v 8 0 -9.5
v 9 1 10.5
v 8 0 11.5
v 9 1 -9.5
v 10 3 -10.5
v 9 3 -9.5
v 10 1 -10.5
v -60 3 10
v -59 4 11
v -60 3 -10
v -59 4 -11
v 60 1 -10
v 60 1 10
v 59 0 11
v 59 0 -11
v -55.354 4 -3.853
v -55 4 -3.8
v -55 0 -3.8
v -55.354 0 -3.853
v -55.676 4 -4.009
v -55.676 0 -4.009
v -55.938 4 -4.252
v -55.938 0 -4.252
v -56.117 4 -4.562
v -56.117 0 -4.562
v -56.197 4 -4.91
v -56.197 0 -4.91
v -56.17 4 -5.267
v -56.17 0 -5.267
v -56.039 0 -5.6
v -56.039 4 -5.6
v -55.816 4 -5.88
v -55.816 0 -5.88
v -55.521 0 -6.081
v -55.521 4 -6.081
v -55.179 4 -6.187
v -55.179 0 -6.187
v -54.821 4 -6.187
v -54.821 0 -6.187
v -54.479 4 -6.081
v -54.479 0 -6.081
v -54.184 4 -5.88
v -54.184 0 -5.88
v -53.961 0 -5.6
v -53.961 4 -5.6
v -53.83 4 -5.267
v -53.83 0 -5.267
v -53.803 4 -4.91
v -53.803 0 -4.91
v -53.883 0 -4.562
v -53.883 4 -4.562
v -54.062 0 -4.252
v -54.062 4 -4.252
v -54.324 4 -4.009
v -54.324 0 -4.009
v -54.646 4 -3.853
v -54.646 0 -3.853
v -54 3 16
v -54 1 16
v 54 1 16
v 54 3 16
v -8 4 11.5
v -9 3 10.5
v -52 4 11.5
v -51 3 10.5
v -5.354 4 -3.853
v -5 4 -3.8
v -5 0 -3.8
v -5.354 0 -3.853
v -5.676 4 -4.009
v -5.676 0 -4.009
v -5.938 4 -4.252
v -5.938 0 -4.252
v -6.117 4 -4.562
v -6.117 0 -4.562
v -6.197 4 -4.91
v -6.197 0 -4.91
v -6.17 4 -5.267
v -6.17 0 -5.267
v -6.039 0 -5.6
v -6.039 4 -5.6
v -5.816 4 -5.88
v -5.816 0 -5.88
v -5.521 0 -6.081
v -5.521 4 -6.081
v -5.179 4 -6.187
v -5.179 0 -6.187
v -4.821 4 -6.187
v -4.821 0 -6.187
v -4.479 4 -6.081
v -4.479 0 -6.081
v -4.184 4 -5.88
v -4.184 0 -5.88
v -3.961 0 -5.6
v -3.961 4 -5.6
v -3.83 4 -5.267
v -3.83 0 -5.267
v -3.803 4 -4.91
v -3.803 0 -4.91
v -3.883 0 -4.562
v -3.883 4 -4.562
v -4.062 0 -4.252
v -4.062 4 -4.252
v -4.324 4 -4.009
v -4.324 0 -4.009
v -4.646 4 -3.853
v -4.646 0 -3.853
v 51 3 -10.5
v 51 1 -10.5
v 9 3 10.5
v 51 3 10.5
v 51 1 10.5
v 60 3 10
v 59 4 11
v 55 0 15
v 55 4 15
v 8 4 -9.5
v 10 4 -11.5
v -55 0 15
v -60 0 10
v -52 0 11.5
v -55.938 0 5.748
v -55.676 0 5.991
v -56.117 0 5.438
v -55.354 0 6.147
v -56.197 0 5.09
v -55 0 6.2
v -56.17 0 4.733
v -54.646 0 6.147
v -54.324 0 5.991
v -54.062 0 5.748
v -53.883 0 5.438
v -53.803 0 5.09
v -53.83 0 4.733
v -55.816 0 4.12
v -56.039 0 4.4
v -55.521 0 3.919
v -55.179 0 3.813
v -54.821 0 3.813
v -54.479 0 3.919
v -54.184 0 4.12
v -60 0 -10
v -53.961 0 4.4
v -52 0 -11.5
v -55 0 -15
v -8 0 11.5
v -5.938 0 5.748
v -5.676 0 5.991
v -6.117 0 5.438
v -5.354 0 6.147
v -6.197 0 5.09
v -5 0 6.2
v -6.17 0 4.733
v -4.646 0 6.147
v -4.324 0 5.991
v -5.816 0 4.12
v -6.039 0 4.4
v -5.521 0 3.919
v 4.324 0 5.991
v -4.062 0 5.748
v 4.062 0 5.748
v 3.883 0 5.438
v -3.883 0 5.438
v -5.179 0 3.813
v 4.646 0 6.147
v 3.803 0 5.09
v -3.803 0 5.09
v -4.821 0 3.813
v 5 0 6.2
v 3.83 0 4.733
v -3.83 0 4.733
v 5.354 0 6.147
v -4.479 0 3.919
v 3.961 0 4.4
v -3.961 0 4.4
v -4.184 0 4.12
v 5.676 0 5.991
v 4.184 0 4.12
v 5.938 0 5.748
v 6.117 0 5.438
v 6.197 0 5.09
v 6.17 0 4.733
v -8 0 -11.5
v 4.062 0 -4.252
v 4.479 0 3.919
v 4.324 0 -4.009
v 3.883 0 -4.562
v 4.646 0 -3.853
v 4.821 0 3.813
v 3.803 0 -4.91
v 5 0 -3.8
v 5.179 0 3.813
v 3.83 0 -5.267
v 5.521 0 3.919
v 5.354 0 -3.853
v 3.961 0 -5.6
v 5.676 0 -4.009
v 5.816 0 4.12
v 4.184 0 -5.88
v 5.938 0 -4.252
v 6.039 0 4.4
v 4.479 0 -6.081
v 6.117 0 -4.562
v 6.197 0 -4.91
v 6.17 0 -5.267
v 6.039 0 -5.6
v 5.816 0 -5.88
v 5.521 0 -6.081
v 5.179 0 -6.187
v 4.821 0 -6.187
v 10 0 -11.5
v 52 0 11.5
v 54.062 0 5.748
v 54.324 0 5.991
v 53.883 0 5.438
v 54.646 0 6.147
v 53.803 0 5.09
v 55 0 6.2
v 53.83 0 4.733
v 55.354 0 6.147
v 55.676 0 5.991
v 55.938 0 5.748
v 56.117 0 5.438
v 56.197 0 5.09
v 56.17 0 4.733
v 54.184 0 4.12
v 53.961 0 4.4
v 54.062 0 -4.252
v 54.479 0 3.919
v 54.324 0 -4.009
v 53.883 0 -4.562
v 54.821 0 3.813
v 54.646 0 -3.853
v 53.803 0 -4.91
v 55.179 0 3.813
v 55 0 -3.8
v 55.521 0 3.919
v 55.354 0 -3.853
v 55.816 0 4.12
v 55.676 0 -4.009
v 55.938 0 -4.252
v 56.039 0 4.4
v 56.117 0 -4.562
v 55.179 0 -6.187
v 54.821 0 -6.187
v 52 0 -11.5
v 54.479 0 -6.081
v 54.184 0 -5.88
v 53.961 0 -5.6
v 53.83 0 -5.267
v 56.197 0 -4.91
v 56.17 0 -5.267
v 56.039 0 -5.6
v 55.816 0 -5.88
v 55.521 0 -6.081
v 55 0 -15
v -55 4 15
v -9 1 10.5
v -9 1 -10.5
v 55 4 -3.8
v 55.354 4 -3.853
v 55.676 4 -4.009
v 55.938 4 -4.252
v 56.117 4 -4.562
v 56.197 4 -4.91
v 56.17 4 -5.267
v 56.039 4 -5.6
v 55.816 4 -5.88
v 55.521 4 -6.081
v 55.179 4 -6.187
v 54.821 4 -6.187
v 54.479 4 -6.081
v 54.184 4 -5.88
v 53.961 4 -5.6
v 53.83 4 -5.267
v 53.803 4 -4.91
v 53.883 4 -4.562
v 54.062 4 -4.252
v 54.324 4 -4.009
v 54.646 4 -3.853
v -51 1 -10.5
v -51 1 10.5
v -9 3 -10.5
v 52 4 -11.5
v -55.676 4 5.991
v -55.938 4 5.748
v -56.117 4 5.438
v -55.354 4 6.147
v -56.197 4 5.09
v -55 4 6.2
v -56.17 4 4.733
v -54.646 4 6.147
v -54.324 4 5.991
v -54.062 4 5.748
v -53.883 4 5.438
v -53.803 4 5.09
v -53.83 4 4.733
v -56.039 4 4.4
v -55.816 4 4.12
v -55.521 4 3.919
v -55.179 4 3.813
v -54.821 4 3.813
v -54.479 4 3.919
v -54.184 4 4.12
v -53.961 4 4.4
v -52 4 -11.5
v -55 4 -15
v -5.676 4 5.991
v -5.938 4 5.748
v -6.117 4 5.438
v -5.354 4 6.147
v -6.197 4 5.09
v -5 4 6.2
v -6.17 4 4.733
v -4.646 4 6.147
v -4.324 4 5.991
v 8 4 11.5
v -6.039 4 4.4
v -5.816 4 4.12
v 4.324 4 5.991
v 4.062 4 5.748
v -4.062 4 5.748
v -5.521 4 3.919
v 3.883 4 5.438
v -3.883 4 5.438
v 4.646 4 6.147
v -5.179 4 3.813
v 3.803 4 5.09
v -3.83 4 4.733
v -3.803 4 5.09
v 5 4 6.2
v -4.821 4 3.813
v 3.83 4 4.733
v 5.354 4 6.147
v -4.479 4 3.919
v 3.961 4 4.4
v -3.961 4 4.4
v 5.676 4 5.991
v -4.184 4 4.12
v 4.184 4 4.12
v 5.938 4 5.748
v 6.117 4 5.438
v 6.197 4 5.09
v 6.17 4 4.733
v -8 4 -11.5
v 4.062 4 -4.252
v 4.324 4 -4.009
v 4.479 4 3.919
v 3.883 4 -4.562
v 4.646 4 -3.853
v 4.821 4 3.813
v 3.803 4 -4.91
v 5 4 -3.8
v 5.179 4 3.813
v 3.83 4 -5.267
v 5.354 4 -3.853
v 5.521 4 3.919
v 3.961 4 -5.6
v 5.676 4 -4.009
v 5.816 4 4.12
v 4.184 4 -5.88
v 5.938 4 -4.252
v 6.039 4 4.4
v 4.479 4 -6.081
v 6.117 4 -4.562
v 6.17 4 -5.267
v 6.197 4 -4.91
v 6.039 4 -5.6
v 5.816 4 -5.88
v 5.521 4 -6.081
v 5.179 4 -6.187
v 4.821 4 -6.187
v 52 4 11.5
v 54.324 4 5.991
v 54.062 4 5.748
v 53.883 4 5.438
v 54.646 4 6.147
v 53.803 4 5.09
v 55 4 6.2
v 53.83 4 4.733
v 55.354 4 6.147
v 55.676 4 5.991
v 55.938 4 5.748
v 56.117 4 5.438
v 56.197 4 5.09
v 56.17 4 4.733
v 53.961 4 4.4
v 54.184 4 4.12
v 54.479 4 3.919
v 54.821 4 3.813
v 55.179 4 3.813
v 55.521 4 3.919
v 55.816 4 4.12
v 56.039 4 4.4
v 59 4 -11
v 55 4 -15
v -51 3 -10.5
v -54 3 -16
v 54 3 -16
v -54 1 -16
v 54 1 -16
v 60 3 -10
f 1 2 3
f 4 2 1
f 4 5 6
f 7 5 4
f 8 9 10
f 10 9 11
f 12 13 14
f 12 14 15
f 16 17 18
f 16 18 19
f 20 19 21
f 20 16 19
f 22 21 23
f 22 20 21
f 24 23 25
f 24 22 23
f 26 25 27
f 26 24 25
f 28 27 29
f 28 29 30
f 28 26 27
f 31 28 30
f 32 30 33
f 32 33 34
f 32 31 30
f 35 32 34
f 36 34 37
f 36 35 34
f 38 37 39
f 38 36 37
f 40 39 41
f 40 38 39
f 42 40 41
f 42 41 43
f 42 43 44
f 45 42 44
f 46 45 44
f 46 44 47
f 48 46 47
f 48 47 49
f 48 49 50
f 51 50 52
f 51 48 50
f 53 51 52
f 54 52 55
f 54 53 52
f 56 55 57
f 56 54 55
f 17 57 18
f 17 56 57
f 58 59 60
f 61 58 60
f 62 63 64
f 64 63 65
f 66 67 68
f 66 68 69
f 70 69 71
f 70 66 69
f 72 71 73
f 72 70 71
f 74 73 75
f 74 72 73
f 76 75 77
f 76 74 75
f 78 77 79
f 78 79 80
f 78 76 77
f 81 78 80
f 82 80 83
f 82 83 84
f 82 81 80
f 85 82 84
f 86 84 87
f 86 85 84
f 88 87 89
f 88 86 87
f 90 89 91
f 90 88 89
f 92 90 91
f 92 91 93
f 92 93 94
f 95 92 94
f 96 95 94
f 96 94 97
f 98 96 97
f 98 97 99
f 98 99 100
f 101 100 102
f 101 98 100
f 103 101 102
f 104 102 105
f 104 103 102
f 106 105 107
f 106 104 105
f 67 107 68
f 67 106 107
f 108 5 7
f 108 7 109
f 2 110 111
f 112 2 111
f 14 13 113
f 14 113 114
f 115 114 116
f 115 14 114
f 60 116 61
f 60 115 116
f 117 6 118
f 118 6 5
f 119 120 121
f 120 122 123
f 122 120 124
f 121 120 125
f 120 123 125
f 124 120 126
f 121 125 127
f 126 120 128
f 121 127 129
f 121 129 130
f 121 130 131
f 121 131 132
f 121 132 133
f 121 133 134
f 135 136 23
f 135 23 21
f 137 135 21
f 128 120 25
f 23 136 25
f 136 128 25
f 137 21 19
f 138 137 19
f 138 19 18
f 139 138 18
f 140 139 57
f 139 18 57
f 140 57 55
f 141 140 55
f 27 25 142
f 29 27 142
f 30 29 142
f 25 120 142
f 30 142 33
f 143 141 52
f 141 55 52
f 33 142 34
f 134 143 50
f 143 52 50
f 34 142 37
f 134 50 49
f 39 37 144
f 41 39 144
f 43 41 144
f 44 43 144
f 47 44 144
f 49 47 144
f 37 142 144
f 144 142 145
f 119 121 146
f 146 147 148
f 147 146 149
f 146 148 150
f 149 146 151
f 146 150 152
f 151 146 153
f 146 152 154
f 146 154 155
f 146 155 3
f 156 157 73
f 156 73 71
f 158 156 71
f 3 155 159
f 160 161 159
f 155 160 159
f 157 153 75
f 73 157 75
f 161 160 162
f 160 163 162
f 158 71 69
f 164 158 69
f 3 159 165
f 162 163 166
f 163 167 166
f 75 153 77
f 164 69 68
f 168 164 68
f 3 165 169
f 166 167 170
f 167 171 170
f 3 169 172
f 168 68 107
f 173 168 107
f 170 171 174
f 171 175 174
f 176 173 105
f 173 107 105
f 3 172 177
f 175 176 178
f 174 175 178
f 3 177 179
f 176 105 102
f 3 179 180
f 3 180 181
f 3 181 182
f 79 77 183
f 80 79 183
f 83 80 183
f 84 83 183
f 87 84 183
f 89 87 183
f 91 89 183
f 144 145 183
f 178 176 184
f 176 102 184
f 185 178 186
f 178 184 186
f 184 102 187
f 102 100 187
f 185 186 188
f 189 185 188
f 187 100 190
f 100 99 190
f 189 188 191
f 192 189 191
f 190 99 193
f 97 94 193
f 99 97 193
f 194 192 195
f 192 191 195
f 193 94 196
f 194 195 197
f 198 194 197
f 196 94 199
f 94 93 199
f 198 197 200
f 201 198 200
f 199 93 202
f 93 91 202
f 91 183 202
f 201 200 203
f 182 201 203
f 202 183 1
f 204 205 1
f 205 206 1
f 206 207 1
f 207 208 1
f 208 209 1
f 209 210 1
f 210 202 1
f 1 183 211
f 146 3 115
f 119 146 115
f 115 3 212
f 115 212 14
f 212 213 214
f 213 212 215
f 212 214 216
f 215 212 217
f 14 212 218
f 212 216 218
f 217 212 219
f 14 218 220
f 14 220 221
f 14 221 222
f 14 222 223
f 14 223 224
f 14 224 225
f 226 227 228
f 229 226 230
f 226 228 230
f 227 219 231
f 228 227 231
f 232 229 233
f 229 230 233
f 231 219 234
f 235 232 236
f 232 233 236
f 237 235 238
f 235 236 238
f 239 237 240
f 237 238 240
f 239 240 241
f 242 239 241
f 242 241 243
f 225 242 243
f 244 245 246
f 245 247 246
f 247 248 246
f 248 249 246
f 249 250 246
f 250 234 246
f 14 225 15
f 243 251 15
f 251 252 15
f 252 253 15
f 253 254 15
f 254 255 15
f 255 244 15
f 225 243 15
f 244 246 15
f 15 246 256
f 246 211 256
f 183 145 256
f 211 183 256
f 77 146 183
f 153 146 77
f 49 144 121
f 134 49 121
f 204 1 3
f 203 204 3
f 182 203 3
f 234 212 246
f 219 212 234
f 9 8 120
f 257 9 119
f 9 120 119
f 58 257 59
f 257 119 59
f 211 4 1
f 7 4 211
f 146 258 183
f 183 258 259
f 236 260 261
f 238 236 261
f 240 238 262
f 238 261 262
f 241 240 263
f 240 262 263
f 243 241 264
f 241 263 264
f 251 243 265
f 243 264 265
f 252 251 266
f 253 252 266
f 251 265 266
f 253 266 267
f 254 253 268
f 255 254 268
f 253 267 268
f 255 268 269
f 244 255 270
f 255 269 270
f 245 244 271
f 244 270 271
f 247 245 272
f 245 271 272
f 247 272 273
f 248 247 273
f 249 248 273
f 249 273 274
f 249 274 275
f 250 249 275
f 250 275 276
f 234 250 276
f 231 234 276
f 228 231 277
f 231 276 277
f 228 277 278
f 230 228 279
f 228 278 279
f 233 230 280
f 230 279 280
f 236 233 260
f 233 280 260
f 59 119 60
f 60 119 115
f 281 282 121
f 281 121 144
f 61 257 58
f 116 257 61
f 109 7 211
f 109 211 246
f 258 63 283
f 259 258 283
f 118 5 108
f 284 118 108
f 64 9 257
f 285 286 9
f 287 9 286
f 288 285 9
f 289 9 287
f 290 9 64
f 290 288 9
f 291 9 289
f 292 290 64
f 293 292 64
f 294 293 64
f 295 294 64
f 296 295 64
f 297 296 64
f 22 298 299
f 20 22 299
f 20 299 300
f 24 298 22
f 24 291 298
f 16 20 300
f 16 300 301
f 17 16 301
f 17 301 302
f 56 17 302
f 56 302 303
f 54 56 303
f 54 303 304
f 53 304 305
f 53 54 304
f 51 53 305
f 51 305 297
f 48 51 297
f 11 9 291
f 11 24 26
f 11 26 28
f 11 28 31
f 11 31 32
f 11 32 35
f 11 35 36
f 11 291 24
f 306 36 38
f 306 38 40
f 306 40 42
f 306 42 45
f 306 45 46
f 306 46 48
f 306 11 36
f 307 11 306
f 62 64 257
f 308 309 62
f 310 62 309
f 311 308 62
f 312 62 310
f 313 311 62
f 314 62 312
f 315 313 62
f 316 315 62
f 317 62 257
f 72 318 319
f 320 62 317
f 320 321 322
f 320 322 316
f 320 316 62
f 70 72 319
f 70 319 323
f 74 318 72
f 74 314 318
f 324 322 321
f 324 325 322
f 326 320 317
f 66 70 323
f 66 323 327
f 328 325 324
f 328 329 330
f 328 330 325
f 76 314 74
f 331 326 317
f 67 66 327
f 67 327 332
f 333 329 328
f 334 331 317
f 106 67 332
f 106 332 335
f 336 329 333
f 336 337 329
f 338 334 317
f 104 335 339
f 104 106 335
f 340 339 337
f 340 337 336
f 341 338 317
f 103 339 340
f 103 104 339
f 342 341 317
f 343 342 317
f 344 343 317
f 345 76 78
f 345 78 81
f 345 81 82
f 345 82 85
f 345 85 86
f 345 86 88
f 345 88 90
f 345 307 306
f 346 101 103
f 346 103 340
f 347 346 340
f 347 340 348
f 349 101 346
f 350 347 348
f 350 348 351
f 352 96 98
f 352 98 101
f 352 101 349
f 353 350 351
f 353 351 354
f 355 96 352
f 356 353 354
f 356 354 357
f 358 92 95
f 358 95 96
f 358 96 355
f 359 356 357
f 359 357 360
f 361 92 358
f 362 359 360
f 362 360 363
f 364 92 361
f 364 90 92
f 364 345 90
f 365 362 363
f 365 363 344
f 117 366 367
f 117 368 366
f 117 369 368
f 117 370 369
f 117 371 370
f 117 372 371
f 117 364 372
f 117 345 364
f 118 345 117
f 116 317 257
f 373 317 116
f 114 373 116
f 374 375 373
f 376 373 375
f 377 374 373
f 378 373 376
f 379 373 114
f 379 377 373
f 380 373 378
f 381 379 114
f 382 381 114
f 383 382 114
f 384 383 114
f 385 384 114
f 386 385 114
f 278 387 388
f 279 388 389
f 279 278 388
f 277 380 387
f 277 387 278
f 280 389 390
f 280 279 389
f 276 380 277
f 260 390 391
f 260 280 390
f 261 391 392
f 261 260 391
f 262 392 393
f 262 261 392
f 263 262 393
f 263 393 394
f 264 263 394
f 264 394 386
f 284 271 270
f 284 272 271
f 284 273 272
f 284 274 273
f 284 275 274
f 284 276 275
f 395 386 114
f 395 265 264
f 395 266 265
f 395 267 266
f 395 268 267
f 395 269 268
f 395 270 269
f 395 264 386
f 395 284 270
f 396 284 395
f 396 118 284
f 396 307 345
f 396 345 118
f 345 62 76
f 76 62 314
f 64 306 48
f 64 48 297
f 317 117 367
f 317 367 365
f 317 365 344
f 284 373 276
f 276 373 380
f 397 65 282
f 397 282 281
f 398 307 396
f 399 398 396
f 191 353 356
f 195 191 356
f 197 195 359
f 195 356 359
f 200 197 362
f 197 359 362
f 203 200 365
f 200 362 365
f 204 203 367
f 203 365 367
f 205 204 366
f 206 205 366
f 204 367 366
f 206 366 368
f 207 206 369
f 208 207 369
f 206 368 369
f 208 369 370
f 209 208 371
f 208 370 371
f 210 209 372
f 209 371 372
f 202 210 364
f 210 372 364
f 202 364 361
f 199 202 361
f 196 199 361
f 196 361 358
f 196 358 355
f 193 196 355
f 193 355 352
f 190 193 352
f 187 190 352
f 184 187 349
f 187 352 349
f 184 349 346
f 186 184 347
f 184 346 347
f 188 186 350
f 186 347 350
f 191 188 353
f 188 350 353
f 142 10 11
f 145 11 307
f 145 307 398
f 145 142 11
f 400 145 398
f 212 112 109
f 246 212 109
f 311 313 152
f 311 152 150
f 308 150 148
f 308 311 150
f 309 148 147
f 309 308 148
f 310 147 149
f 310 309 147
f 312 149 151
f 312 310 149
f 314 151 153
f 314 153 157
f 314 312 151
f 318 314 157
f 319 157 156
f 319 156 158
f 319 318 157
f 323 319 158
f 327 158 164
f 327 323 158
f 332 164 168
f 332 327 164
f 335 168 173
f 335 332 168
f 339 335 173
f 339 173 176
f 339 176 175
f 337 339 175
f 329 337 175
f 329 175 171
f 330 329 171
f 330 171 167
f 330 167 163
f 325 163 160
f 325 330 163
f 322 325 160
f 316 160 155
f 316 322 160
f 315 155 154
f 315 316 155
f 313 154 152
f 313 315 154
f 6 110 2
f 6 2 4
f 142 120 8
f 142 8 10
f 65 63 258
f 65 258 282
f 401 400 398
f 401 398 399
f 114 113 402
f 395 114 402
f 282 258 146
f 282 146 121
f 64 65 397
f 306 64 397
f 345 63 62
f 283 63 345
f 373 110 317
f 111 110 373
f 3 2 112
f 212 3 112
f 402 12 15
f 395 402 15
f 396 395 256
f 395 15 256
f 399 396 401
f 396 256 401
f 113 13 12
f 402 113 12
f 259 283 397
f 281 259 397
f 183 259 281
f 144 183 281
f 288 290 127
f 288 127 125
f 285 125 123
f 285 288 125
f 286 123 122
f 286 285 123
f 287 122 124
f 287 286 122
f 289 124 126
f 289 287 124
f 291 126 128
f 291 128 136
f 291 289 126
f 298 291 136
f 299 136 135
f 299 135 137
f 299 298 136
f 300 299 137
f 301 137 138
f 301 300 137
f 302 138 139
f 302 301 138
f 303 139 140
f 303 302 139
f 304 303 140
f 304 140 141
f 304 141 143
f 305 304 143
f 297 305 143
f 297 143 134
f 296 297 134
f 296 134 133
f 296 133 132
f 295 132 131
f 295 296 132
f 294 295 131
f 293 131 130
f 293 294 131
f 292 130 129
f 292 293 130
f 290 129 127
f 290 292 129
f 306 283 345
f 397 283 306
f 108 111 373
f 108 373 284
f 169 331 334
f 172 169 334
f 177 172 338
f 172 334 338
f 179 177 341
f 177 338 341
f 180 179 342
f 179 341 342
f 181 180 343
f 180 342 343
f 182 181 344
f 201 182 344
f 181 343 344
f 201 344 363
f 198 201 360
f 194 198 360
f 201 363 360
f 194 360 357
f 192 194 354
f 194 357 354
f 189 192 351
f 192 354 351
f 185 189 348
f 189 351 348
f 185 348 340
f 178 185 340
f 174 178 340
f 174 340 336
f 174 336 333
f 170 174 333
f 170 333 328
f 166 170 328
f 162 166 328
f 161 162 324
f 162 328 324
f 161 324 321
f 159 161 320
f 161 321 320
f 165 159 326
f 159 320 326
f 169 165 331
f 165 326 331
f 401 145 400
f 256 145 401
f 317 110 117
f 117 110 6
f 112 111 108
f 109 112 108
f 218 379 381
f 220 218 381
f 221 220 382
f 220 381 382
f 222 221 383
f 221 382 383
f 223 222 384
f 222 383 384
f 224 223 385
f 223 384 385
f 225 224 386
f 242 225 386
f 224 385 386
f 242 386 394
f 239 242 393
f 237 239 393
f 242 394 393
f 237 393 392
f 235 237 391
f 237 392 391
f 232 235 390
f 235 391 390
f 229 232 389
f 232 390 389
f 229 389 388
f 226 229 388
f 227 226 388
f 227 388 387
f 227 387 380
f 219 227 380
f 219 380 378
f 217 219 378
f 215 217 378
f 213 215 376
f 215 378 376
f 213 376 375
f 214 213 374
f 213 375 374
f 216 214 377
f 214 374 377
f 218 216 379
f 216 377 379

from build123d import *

# Parameters (mm, degrees)
SKETCH1_W           = 120
SKETCH1_H           = 32
BOSS_EXTRUDE1_DEPTH = 4
SKETCH2_R           = 1.2
SKETCH2_W           = 42
SKETCH2_H           = 21
CUT_EXTRUDE1_DEPTH  = 4
CHAMFER1_SIZE       = 1
CUT_EXTRUDE2_DEPTH  = 10


with BuildPart() as part:
    # Sketch1 → Boss-Extrude1 (new body)
    with BuildSketch(Plane(origin=(0, 0, 0), x_dir=(1, 0, 0), z_dir=(0, 1, 0))):
        Rectangle(SKETCH1_W, SKETCH1_H)
    extrude(amount=BOSS_EXTRUDE1_DEPTH)

    # Sketch2 → Cut-Extrude1 (cut)
    with BuildSketch(Plane(origin=(0, 4, 0), x_dir=(1, 0, 0), z_dir=(0, 1, 0))):
        with Locations(Location((55, 5, 0), (0, 0, 270))):
            Circle(SKETCH2_R)
        with Locations(Location((55, -5, 0), (0, 0, 270))):
            Circle(SKETCH2_R)
        with Locations(Location((5, 5, 0), (0, 0, 270))):
            Circle(SKETCH2_R)
        with Locations(Location((5, -5, 0), (0, 0, 270))):
            Circle(SKETCH2_R)
        with Locations((30, 0)):
            Rectangle(SKETCH2_W, SKETCH2_H)
    cut_extrude1 = extrude(amount=-CUT_EXTRUDE1_DEPTH, mode=Mode.SUBTRACT)

    # Mirror1: Cut-Extrude1 across plane
    add(cut_extrude1.mirror(Plane(origin=(0, 0, 0), x_dir=(0, 0, 1), z_dir=(1, 0, 0))), mode=Mode.SUBTRACT)

    # Chamfer1
    chamfer1_edges = [part.edges().sort_by_distance(p)[0] for p in [
        (-60, 4, 0),
        (0, 4, 16),
        (9, 0, 0),
        (30, 0, -10.5),
        (9, 2, -10.5),
        (51, 0, 0),
        (30, 0, 10.5),
        (9, 4, 0),
        (30, 4, 10.5),
        (51, 4, 0),
        (30, 4, -10.5),
        (60, 4, 0),
        (0, 0, 16),
        (0, 0, -16),
        (60, 0, 0),
        (-9, 4, 0),
        (-30, 4, 10.5),
        (-51, 4, 0),
        (-30, 4, -10.5),
        (-9, 0, 0),
        (-30, 0, 10.5),
        (-51, 0, 0),
        (-30, 0, -10.5),
        (0, 4, -16),
        (60, 2, 16),
        (-60, 2, 16),
        (-60, 2, -16),
        (60, 2, -16),
    ]]
    chamfer(chamfer1_edges, length=CHAMFER1_SIZE)

    # Sketch3 → Cut-Extrude2 (cut)
    with BuildSketch(Plane.XZ):
        Polygon((-60, 10), (-54, 16), (-63.164716505, 19.318756061), align=None)
        Polygon((-60, -10), (-54, -16), (-62.553854867, -17.935195974), align=None)
    cut_extrude2 = extrude(amount=-CUT_EXTRUDE2_DEPTH, mode=Mode.SUBTRACT)

    # Mirror2: Cut-Extrude2 across plane
    add(cut_extrude2.mirror(Plane(origin=(0, 0, 0), x_dir=(0, 0, 1), z_dir=(1, 0, 0))), mode=Mode.SUBTRACT)


solid = part.part
